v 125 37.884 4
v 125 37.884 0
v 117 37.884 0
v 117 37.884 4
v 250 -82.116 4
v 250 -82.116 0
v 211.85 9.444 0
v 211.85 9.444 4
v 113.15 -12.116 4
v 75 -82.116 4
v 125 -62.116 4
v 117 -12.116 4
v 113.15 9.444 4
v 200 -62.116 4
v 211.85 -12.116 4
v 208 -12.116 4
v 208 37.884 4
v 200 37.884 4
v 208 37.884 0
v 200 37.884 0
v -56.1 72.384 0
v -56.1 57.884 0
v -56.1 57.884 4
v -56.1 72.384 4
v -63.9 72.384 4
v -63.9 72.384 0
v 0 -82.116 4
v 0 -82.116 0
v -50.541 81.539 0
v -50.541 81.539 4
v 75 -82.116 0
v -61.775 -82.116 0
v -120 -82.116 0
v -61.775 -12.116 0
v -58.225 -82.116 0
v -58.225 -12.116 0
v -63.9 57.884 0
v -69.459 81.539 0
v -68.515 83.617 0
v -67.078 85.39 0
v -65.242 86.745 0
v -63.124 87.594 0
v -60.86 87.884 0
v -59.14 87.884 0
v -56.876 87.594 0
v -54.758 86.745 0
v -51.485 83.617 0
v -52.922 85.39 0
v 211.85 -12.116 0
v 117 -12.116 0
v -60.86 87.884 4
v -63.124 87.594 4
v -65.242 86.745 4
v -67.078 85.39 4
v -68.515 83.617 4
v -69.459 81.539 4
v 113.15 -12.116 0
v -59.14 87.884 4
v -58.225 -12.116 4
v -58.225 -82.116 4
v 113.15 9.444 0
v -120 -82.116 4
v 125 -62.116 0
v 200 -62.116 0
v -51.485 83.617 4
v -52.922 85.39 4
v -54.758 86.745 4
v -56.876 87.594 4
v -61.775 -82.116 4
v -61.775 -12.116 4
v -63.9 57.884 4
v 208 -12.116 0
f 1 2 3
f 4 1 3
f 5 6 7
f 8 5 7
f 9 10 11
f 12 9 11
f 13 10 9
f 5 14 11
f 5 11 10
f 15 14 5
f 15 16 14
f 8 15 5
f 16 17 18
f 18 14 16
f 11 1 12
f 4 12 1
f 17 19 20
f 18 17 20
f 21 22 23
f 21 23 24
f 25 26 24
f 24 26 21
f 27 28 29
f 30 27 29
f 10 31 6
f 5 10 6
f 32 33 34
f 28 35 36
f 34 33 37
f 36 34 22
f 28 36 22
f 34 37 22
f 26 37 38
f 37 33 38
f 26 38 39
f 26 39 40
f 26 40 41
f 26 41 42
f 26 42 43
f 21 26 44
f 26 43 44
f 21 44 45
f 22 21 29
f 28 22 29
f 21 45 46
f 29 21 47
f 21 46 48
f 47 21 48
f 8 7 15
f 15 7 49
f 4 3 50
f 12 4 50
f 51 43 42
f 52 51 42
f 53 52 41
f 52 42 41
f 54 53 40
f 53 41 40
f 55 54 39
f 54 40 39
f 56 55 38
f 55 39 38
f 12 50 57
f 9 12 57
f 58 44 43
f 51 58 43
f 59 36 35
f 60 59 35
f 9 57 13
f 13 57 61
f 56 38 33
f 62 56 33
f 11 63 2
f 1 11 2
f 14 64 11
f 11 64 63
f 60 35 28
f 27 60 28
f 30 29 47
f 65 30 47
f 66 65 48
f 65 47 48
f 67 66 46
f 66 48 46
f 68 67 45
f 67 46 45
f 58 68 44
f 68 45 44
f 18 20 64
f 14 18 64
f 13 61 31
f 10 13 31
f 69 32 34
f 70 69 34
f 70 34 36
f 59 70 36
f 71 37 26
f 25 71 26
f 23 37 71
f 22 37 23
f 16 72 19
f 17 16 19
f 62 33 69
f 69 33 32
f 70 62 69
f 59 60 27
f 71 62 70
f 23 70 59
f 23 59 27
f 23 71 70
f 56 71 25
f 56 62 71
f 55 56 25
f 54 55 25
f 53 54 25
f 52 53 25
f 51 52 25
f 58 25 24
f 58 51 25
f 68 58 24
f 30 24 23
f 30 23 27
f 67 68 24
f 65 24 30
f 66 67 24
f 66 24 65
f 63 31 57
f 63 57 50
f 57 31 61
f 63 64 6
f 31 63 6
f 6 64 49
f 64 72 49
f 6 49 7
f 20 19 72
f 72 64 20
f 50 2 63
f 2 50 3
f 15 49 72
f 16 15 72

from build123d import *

# Parameters (mm, degrees)
F0_W     = 7.8
F0_H     = 14.5
F1_DEPTH = 4


# Not quite as in the source:
# - a feature names something its author has since deleted; it is built from what else it names


with BuildPart() as f1:
    # F0 (on Top) → F1 (new body)
    with BuildSketch(Plane.XY):
        with BuildLine():
            Line((-59.1399900081, 87.8836867213), (-60.8600099919, 87.8836867213))
            ThreePointArc((-60.8600099919, 87.8836867213), (-66.2031870254, 86.1259556468), (-69.4592822125, 81.5393443189))
            Line((-69.4592822125, 81.5393443189), (-120, -82.1163132787))
            Line((-120, -82.1163132787), (-61.775, -82.1163132787))
            Line((-61.775, -82.1163132787), (-61.775, -12.1163132787))
            Line((-61.775, -12.1163132787), (-58.225, -12.1163132787))
            Line((-58.225, -12.1163132787), (-58.225, -82.1163132787))
            Line((-58.225, -82.1163132787), (0, -82.1163132787))
            Line((0, -82.1163132787), (-50.5407177875, 81.5393443189))
            ThreePointArc((-50.5407177875, 81.5393443189), (-53.7968129746, 86.1259556468), (-59.1399900081, 87.8836867213))
        make_face()
        with Locations((-60, 65.1336867213)):
            Rectangle(F0_W, F0_H, mode=Mode.SUBTRACT)
    extrude(amount=F1_DEPTH)


with BuildPart() as f1b:
    # F0 (on Top) → F1, piece 2 (new body)
    with BuildSketch(Plane.XY):
        Polygon((125, -82.1163132787), (200, -82.1163132787), (250, -82.1163132787), (211.85, 9.4436867213), (211.85, -12.1163132787), (208, -12.1163132787), (208, 18.6836867213), (208, 37.8836867213), (200, 37.8836867213), (200, 24.5272498578), (200, -62.1163132787), (125, -62.1163132787), (125, 24.5272498578), (125, 37.8836867213), (117, 37.8836867213), (117, 18.6836867213), (117, -12.1163132787), (113.15, -12.1163132787), (113.15, 9.4436867213), (75, -82.1163132787), align=None)
    extrude(amount=F1_DEPTH)


solid = Compound([f1.part, f1b.part])
